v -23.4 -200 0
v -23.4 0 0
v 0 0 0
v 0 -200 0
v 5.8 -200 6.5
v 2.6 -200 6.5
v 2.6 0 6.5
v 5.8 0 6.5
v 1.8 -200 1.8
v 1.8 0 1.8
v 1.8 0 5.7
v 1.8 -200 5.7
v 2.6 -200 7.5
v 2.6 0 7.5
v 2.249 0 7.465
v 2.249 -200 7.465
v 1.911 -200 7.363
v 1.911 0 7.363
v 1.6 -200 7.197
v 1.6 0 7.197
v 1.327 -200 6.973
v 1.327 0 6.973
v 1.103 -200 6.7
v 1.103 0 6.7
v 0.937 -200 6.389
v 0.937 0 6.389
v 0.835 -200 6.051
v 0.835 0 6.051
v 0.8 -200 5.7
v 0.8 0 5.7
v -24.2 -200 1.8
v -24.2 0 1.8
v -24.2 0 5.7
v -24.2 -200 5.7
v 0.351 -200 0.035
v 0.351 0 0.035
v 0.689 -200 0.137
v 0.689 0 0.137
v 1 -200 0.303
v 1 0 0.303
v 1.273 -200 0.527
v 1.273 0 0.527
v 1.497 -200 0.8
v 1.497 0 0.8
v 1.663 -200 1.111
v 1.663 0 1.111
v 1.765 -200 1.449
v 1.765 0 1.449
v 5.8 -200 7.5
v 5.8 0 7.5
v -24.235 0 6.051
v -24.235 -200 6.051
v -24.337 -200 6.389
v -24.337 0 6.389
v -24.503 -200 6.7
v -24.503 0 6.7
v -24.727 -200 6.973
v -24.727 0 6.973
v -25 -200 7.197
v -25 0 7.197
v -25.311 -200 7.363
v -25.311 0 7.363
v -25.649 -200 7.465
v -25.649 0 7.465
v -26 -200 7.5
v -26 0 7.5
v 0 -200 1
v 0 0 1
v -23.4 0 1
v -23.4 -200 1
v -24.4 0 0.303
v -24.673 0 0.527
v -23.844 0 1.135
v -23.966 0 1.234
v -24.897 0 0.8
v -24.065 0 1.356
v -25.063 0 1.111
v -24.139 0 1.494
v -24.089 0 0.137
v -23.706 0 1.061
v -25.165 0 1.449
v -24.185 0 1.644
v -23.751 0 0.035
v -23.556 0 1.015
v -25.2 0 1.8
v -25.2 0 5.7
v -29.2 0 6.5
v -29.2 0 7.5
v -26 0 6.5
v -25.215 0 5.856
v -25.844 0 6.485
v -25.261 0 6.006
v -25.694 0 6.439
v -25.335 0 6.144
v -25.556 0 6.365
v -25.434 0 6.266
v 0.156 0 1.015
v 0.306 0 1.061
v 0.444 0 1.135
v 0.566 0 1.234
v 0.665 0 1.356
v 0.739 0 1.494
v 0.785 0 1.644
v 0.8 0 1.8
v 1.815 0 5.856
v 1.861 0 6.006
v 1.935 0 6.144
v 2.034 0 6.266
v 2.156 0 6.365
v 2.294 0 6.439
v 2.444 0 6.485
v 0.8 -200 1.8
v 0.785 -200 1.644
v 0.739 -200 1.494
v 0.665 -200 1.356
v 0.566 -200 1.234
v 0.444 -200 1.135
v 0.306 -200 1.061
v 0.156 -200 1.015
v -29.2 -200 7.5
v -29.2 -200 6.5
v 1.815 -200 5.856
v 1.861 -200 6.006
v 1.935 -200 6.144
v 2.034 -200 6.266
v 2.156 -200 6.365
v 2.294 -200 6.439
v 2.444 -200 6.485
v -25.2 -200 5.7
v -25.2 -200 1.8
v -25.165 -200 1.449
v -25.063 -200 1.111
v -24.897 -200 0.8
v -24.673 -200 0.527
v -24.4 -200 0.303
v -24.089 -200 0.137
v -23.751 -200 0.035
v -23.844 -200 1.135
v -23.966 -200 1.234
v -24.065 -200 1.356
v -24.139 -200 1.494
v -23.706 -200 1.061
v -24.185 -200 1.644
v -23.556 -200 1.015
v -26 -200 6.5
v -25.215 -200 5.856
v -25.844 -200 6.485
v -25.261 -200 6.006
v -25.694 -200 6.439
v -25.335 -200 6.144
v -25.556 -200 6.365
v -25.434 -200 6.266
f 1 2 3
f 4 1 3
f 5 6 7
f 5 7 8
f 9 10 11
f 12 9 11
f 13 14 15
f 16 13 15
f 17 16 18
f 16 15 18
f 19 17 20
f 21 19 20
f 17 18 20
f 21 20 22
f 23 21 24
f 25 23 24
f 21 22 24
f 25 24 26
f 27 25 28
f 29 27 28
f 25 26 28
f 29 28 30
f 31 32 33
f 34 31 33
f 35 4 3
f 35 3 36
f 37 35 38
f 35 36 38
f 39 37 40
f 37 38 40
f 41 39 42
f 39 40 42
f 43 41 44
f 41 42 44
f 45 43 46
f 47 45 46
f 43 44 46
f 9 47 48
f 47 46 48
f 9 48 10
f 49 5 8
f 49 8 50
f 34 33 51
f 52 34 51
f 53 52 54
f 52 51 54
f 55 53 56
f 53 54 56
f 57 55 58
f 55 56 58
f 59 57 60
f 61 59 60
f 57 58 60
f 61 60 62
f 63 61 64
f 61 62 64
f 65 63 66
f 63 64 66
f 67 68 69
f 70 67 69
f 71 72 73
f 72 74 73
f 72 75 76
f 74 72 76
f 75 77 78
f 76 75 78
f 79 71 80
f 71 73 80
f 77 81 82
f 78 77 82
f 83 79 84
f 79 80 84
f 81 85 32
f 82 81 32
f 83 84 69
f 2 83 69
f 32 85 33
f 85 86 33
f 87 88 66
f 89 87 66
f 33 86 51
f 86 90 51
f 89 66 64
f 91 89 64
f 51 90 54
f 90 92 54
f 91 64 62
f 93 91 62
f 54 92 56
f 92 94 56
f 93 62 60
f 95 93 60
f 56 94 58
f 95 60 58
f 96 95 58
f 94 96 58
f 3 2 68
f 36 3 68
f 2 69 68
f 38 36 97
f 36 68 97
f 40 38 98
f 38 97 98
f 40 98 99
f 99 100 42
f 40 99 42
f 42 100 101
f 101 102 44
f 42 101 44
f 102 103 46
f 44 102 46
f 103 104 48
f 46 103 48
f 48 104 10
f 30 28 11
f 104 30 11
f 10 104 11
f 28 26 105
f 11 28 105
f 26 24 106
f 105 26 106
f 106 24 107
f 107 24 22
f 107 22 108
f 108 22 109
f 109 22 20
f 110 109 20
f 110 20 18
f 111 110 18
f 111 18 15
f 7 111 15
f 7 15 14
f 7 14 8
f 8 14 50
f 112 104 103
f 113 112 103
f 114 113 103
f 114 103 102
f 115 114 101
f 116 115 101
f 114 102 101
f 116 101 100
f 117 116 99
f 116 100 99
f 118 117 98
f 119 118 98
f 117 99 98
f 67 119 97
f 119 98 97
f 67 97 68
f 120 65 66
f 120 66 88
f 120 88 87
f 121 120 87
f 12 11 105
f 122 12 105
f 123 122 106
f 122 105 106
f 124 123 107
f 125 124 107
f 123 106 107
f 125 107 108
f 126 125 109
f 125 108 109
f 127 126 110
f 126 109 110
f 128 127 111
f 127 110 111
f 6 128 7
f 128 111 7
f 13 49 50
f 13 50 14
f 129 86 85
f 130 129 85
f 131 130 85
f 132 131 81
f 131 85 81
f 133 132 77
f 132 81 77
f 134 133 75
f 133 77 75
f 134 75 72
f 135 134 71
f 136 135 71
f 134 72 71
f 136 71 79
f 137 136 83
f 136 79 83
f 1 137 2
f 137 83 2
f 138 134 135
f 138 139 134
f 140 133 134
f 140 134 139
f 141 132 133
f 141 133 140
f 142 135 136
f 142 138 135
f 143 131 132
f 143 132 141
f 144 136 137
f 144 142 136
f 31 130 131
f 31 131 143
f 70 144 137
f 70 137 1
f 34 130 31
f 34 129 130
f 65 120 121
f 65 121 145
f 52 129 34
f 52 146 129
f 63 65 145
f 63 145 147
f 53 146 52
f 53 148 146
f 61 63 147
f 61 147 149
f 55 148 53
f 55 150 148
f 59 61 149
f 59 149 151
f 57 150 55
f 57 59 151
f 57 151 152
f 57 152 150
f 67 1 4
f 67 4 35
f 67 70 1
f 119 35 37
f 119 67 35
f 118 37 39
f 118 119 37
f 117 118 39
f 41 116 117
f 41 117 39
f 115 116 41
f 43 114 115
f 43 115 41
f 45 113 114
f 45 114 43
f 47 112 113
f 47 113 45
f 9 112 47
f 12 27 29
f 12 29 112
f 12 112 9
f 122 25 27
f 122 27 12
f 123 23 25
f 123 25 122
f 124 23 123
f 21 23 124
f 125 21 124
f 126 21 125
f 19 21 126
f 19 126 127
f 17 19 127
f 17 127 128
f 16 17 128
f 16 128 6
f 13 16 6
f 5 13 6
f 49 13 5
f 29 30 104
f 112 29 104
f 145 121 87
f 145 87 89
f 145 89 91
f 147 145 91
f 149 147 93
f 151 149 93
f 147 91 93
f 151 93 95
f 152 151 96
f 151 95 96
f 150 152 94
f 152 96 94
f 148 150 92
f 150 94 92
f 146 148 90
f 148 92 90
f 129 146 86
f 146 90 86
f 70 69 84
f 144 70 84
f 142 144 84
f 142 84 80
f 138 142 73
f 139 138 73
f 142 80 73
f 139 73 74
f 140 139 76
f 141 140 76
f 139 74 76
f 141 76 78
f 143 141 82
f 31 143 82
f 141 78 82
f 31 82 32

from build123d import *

# Parameters (mm, degrees)
F1_DEPTH = 200


with BuildPart() as f1:
    # F0 (on Front) → F1 (new body)
    with BuildSketch(Plane.XZ):
        with BuildLine():
            Line((-23.4, 0), (0, 0))
            ThreePointArc((0, 0), (1.272792, 0.527208), (1.8, 1.8))
            Line((1.8, 1.8), (1.8, 5.7))
            ThreePointArc((1.8, 5.7), (2.034315, 6.265685), (2.6, 6.5))
            Line((2.6, 6.5), (5.7996, 6.5))
            Line((5.7996, 6.5), (5.8004, 7.5))
            Line((5.8004, 7.5), (2.6, 7.5))
            ThreePointArc((2.6, 7.5), (1.327208, 6.972792), (0.8, 5.7))
            Line((0.8, 5.7), (0.8, 1.8))
            ThreePointArc((0.8, 1.8), (0.565685, 1.234315), (0, 1))
            Line((0, 1), (-23.4, 1))
            ThreePointArc((-23.4, 1), (-23.965685, 1.234315), (-24.2, 1.8))
            Line((-24.2, 1.8), (-24.2, 5.7))
            ThreePointArc((-24.2, 5.7), (-24.727208, 6.972792), (-26, 7.5))
            Line((-26, 7.5), (-29.2004, 7.5))
            Line((-29.2004, 7.5), (-29.2004, 6.5))
            Line((-29.2004, 6.5), (-26, 6.5))
            ThreePointArc((-26, 6.5), (-25.434315, 6.265685), (-25.2, 5.7))
            Line((-25.2, 5.7), (-25.2, 1.8))
            ThreePointArc((-25.2, 1.8), (-24.672792, 0.527208), (-23.4, 0))
        make_face()
    extrude(amount=F1_DEPTH)


solid = f1.part
